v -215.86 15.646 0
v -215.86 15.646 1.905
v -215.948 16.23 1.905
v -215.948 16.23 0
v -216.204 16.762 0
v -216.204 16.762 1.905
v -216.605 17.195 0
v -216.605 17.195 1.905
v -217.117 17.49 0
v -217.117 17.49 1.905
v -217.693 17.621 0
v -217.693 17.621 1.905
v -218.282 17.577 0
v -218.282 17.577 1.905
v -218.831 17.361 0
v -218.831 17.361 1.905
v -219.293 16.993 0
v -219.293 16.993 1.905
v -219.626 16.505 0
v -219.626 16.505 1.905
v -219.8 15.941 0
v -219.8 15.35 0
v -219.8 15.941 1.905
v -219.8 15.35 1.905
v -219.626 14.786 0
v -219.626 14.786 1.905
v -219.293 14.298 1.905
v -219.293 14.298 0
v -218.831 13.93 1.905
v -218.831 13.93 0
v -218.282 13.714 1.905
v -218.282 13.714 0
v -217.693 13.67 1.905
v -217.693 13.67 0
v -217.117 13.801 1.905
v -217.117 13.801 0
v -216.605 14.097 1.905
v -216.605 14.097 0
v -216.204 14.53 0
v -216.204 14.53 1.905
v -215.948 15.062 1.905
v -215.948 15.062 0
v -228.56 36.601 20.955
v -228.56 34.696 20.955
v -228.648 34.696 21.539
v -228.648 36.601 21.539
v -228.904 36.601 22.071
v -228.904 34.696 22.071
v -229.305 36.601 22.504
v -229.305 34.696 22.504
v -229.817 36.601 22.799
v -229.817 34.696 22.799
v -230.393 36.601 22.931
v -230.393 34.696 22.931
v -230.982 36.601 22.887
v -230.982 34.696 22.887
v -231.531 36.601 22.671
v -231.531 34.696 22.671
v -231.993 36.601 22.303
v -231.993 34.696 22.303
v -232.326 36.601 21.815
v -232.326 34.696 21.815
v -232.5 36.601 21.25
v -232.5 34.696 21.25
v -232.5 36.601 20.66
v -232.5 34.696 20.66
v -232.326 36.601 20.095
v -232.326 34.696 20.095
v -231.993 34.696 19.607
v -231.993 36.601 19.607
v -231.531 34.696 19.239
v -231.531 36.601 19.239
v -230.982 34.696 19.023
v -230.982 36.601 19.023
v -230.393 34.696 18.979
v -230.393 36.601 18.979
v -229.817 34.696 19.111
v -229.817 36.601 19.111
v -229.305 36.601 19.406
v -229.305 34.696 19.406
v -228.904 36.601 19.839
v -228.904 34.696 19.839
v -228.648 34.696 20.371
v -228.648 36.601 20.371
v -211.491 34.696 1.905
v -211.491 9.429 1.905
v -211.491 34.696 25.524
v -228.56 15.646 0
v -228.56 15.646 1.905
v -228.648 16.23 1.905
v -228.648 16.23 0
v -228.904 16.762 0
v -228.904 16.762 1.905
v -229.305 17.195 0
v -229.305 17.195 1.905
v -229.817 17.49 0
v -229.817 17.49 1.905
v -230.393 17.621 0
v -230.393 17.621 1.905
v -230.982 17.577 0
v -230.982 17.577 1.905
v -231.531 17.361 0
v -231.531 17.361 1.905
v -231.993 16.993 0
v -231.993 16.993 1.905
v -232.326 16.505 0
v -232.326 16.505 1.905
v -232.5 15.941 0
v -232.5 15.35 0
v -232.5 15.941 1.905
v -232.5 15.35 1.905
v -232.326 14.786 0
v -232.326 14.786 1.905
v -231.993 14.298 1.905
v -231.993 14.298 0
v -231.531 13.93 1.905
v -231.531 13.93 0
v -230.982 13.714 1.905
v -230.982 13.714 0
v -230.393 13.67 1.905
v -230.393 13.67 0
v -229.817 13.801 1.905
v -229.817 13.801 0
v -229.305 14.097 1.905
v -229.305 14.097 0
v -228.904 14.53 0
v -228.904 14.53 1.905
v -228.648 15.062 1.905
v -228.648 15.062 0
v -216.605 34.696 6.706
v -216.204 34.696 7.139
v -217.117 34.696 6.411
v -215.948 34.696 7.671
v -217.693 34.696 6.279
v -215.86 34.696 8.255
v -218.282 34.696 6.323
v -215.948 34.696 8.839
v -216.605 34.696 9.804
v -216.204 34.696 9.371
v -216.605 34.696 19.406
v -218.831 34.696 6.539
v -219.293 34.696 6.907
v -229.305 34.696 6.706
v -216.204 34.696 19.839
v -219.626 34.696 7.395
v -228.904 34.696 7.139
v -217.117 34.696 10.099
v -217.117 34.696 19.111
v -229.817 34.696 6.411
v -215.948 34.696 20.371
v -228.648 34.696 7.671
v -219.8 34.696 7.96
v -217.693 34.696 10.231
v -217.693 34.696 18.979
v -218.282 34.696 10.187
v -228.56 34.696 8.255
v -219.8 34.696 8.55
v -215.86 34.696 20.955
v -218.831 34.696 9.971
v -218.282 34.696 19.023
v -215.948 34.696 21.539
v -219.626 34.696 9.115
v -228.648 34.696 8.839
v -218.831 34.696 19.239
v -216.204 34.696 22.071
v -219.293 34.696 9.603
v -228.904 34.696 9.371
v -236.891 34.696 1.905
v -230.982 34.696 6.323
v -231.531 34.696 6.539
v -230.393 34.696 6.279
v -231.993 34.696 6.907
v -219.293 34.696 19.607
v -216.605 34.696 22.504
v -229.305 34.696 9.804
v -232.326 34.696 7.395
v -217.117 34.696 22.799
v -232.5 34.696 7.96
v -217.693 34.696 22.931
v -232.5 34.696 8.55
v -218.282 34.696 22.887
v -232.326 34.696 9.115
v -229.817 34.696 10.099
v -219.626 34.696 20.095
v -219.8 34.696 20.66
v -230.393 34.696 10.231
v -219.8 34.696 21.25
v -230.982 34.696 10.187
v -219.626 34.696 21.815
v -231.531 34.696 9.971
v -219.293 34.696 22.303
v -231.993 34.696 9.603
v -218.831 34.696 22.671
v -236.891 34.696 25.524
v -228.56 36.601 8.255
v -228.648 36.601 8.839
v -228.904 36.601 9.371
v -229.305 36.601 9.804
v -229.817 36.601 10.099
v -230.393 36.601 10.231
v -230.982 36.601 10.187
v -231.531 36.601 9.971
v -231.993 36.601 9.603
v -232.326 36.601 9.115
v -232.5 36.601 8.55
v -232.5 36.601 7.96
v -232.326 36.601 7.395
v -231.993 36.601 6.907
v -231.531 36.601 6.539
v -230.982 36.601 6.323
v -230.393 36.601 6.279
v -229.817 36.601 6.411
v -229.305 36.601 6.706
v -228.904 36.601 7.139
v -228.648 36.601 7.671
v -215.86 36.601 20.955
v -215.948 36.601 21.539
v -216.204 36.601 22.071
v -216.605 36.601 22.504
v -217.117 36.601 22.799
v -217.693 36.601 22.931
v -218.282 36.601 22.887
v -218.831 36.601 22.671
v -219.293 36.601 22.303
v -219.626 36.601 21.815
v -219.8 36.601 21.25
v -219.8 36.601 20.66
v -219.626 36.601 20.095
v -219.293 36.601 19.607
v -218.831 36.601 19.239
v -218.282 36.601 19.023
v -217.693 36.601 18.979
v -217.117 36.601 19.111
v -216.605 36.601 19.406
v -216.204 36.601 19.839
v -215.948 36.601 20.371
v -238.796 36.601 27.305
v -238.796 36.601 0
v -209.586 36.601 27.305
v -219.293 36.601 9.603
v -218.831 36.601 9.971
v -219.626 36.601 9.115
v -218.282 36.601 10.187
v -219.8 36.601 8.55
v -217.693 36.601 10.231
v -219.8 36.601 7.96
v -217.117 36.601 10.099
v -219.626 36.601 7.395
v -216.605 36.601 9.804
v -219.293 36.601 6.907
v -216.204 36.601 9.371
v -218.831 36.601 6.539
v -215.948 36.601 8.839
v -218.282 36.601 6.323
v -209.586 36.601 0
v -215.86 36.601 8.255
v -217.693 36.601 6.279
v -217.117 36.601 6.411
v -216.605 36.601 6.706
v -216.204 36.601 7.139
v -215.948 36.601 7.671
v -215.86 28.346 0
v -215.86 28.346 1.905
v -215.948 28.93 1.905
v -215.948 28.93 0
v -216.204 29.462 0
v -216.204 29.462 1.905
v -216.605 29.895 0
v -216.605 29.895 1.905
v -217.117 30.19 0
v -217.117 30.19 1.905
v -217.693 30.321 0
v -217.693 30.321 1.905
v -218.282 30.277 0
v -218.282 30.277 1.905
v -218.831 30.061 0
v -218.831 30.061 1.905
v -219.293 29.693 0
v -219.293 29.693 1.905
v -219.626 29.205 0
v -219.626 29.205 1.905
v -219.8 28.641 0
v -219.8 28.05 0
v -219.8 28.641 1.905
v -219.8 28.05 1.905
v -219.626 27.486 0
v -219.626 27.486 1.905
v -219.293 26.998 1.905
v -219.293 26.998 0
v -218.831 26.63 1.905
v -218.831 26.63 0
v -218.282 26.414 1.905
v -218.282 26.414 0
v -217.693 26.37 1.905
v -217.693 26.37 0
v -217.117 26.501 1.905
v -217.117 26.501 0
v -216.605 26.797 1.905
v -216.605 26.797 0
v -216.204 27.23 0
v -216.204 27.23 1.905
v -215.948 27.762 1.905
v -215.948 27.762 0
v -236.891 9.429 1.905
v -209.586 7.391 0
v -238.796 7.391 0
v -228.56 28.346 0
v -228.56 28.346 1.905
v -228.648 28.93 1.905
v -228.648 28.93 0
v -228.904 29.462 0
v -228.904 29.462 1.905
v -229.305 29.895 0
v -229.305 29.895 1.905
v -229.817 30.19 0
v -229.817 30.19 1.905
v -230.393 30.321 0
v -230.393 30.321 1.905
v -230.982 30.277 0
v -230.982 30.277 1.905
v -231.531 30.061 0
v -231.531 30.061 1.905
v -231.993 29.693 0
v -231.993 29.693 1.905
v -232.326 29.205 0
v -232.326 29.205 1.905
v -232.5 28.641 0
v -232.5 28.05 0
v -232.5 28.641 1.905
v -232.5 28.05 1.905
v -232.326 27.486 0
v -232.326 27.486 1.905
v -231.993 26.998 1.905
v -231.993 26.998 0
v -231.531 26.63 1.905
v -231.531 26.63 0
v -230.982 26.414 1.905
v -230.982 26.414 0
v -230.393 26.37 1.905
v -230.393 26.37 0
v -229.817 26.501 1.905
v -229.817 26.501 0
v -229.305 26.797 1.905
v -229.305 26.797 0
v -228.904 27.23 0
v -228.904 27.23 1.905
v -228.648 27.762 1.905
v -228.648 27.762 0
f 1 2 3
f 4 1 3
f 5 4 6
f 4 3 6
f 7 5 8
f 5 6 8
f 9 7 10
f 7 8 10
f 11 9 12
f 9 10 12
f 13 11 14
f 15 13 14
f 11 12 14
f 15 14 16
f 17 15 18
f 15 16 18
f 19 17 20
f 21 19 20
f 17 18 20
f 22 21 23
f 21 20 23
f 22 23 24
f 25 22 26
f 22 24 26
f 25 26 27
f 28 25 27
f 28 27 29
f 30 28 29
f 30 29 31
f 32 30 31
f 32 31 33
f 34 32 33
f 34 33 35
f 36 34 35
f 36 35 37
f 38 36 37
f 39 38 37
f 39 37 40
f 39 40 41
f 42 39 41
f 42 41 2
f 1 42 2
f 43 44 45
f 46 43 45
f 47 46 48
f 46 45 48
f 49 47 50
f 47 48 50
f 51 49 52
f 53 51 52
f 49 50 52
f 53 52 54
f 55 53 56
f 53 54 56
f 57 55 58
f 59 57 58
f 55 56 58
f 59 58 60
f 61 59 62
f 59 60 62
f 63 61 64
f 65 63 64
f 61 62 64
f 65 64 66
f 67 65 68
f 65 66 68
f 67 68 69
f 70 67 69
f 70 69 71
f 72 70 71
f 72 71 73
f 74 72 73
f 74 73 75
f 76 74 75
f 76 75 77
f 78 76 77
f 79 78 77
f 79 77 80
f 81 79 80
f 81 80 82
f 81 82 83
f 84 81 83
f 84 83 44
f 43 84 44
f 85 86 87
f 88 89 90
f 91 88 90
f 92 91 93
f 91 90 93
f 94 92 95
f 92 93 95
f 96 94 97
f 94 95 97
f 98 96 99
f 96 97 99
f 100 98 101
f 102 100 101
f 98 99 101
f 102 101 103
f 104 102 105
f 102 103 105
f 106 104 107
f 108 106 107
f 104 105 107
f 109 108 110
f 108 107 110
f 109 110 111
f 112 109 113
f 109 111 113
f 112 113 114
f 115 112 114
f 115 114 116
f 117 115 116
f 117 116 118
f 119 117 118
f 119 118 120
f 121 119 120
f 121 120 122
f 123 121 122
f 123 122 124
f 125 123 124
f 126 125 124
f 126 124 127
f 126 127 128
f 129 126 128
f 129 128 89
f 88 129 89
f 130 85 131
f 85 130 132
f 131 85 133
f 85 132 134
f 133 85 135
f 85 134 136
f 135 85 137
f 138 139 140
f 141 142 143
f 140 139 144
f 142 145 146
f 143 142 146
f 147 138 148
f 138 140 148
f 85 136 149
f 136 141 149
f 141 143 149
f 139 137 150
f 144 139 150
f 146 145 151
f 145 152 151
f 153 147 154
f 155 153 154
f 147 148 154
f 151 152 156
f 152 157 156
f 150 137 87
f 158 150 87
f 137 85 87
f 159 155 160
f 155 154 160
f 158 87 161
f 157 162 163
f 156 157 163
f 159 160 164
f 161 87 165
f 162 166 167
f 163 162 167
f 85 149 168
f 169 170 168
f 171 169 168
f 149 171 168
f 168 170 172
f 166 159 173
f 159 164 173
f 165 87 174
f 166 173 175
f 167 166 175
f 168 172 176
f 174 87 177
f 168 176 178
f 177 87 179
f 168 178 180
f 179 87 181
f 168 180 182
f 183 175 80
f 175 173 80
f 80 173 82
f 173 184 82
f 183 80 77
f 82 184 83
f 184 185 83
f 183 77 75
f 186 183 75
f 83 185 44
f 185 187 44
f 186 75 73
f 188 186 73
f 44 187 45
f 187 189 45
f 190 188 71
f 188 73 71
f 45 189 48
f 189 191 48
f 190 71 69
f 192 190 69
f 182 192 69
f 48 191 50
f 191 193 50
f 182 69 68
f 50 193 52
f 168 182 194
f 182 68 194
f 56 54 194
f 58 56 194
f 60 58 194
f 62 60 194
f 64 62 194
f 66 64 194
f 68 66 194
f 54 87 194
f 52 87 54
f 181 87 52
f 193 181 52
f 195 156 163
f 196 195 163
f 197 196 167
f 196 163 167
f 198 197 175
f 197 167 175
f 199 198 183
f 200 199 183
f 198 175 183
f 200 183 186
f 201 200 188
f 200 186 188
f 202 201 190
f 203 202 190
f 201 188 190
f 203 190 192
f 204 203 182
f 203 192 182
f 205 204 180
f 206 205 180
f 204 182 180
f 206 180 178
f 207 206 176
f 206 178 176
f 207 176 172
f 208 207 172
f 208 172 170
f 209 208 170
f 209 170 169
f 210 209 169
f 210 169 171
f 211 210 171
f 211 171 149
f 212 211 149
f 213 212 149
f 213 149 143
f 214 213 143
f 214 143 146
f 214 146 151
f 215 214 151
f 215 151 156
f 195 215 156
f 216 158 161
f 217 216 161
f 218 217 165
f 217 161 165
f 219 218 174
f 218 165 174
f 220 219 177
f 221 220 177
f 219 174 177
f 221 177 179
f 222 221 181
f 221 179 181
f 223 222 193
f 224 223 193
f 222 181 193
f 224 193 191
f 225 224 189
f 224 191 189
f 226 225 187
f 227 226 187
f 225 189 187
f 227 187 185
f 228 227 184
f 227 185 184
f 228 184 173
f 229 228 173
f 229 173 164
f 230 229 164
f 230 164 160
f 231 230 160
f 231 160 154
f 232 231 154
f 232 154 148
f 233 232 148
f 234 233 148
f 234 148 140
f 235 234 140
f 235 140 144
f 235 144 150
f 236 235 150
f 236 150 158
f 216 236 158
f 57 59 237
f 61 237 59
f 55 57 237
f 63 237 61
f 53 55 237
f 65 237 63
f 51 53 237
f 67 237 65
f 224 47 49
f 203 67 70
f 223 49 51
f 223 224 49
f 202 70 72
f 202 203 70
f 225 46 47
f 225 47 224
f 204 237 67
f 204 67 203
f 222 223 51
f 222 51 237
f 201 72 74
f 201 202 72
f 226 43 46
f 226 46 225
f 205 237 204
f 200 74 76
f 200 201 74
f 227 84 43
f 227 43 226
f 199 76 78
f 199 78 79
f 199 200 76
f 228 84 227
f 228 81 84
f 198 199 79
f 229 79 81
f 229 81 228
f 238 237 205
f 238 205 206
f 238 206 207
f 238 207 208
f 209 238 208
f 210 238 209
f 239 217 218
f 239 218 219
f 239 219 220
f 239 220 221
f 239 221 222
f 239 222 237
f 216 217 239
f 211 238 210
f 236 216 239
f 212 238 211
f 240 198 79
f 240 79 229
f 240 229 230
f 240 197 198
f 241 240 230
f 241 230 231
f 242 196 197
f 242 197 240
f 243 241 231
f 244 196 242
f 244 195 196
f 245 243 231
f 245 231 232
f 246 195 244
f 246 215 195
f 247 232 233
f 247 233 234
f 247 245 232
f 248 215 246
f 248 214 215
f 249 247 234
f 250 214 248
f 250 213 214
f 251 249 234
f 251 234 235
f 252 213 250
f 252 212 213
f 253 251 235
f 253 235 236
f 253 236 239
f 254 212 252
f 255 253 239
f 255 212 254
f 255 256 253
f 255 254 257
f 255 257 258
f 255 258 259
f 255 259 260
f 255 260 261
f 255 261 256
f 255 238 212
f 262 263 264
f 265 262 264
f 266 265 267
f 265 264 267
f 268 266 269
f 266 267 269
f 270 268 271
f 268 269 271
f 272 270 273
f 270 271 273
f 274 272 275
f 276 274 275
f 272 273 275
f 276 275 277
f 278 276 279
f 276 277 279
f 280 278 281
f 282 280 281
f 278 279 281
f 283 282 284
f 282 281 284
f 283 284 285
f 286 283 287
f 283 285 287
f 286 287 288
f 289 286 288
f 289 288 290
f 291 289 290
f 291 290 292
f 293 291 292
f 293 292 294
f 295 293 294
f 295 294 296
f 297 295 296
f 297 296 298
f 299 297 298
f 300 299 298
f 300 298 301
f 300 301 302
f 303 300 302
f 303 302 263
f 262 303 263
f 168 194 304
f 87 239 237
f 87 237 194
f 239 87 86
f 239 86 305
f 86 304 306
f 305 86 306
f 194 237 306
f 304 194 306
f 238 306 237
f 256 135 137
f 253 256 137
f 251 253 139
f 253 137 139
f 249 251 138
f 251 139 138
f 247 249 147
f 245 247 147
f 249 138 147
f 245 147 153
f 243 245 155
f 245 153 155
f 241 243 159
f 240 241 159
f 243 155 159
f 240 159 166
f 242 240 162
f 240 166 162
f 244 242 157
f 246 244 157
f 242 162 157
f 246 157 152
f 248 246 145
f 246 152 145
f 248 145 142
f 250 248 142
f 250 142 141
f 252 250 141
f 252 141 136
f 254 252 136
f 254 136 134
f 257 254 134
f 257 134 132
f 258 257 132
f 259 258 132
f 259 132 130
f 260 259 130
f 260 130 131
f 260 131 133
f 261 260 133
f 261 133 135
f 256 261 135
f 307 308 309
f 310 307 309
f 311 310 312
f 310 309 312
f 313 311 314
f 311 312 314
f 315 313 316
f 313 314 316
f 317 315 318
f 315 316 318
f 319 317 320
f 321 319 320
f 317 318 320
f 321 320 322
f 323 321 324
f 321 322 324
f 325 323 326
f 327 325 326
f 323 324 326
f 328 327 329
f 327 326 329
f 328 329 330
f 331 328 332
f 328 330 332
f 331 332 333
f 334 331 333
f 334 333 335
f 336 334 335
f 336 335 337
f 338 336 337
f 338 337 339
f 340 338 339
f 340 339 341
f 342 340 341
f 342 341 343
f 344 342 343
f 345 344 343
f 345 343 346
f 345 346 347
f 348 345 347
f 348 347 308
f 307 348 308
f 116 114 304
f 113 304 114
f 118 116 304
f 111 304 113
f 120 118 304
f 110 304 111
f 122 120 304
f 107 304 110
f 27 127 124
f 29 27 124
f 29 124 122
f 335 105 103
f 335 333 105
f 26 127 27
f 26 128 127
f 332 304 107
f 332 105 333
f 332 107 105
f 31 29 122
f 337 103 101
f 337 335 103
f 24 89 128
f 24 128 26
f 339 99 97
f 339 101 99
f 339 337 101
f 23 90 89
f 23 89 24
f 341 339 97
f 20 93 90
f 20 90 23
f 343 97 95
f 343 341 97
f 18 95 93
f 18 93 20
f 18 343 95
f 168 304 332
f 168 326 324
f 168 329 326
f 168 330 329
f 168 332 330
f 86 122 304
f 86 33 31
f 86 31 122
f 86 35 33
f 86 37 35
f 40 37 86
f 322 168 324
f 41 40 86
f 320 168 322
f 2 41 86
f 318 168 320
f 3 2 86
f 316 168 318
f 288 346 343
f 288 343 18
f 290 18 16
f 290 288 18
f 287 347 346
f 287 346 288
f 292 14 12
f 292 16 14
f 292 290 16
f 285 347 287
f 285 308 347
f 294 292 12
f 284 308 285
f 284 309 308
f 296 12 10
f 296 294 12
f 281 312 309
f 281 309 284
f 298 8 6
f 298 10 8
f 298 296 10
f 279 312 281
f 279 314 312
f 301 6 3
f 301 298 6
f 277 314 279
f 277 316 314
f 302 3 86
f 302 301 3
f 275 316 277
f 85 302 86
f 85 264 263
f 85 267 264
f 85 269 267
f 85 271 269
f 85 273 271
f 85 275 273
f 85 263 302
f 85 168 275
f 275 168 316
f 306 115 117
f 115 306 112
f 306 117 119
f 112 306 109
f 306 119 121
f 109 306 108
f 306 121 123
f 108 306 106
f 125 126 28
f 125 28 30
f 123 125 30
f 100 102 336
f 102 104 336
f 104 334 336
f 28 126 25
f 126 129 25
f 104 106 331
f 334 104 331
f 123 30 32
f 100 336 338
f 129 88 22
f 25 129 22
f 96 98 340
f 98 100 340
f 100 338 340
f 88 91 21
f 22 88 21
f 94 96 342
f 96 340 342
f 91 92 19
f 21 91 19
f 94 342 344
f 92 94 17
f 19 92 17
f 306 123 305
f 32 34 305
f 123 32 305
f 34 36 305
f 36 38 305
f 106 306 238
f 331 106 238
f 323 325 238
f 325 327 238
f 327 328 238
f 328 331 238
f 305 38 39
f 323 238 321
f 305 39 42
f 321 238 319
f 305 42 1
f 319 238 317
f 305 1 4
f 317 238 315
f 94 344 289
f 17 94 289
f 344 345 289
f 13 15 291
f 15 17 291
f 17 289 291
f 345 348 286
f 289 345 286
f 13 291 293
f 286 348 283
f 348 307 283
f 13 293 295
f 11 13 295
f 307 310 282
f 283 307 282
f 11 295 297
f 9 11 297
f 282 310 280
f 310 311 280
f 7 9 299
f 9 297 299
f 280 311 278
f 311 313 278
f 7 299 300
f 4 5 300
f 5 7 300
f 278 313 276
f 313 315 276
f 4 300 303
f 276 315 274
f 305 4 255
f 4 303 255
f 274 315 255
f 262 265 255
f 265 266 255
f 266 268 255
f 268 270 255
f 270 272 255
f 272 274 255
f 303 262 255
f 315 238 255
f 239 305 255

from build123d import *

# Parameters (mm, degrees)
F0_W     = 29.21
F0_H     = 29.21
F1_DEPTH = 27.305
F4_DEPTH = 25.4
F5_DEPTH = 29.21
F6_R     = 1.9812
F8_DEPTH = 25.4
F7_R     = 1.9812
F9_DEPTH = 25.4


with BuildPart() as f1:
    # F0 (on Top) → F1 (new body)
    with BuildSketch(Plane.XY):
        with Locations((-224.190711, 21.995599)):
            Rectangle(F0_W, F0_H)
    extrude(amount=F1_DEPTH)

    # F2 (on face) → F4 (cut)
    with BuildSketch(Plane.XY.offset(27.305)):
        Polygon((-236.890711, 34.695599), (-236.890711, 7.390599), (-211.490711, 7.390599), (-211.490711, 34.695599), (-224.190711, 34.695599), align=None)
    extrude(amount=-F4_DEPTH, mode=Mode.SUBTRACT)

    # F3 (on face) → F5 (cut)
    with BuildSketch(Plane(origin=(-238.795711, 0, 0), x_dir=(0, -1, 0), z_dir=(-1, 0, 0))):
        Polygon((-7.390599, 27.305), (-36.600599, 27.305), (-7.390599, 0), align=None)
    extrude(amount=-F5_DEPTH, mode=Mode.SUBTRACT)

    # F6 (on face) → F8 (cut)
    with BuildSketch(Plane.XY.offset(1.905)):
        with Locations((-230.540711, 28.345599)):
            Circle(F6_R)
        with Locations((-217.840711, 28.345599)):
            Circle(F6_R)
        with Locations((-217.840711, 15.645599)):
            Circle(F6_R)
        with Locations((-230.540711, 15.645599)):
            Circle(F6_R)
    extrude(amount=-F8_DEPTH, mode=Mode.SUBTRACT)

    # F7 (on face) → F9 (cut)
    with BuildSketch(Plane.XZ.offset(-34.695599)):
        with Locations((-230.540711, 8.255)):
            Circle(F7_R)
        with Locations((-230.540711, 20.955)):
            Circle(F7_R)
        with Locations((-217.840711, 20.955)):
            Circle(F7_R)
        with Locations((-217.840711, 8.255)):
            Circle(F7_R)
    extrude(amount=-F9_DEPTH, mode=Mode.SUBTRACT)


solid = f1.part
